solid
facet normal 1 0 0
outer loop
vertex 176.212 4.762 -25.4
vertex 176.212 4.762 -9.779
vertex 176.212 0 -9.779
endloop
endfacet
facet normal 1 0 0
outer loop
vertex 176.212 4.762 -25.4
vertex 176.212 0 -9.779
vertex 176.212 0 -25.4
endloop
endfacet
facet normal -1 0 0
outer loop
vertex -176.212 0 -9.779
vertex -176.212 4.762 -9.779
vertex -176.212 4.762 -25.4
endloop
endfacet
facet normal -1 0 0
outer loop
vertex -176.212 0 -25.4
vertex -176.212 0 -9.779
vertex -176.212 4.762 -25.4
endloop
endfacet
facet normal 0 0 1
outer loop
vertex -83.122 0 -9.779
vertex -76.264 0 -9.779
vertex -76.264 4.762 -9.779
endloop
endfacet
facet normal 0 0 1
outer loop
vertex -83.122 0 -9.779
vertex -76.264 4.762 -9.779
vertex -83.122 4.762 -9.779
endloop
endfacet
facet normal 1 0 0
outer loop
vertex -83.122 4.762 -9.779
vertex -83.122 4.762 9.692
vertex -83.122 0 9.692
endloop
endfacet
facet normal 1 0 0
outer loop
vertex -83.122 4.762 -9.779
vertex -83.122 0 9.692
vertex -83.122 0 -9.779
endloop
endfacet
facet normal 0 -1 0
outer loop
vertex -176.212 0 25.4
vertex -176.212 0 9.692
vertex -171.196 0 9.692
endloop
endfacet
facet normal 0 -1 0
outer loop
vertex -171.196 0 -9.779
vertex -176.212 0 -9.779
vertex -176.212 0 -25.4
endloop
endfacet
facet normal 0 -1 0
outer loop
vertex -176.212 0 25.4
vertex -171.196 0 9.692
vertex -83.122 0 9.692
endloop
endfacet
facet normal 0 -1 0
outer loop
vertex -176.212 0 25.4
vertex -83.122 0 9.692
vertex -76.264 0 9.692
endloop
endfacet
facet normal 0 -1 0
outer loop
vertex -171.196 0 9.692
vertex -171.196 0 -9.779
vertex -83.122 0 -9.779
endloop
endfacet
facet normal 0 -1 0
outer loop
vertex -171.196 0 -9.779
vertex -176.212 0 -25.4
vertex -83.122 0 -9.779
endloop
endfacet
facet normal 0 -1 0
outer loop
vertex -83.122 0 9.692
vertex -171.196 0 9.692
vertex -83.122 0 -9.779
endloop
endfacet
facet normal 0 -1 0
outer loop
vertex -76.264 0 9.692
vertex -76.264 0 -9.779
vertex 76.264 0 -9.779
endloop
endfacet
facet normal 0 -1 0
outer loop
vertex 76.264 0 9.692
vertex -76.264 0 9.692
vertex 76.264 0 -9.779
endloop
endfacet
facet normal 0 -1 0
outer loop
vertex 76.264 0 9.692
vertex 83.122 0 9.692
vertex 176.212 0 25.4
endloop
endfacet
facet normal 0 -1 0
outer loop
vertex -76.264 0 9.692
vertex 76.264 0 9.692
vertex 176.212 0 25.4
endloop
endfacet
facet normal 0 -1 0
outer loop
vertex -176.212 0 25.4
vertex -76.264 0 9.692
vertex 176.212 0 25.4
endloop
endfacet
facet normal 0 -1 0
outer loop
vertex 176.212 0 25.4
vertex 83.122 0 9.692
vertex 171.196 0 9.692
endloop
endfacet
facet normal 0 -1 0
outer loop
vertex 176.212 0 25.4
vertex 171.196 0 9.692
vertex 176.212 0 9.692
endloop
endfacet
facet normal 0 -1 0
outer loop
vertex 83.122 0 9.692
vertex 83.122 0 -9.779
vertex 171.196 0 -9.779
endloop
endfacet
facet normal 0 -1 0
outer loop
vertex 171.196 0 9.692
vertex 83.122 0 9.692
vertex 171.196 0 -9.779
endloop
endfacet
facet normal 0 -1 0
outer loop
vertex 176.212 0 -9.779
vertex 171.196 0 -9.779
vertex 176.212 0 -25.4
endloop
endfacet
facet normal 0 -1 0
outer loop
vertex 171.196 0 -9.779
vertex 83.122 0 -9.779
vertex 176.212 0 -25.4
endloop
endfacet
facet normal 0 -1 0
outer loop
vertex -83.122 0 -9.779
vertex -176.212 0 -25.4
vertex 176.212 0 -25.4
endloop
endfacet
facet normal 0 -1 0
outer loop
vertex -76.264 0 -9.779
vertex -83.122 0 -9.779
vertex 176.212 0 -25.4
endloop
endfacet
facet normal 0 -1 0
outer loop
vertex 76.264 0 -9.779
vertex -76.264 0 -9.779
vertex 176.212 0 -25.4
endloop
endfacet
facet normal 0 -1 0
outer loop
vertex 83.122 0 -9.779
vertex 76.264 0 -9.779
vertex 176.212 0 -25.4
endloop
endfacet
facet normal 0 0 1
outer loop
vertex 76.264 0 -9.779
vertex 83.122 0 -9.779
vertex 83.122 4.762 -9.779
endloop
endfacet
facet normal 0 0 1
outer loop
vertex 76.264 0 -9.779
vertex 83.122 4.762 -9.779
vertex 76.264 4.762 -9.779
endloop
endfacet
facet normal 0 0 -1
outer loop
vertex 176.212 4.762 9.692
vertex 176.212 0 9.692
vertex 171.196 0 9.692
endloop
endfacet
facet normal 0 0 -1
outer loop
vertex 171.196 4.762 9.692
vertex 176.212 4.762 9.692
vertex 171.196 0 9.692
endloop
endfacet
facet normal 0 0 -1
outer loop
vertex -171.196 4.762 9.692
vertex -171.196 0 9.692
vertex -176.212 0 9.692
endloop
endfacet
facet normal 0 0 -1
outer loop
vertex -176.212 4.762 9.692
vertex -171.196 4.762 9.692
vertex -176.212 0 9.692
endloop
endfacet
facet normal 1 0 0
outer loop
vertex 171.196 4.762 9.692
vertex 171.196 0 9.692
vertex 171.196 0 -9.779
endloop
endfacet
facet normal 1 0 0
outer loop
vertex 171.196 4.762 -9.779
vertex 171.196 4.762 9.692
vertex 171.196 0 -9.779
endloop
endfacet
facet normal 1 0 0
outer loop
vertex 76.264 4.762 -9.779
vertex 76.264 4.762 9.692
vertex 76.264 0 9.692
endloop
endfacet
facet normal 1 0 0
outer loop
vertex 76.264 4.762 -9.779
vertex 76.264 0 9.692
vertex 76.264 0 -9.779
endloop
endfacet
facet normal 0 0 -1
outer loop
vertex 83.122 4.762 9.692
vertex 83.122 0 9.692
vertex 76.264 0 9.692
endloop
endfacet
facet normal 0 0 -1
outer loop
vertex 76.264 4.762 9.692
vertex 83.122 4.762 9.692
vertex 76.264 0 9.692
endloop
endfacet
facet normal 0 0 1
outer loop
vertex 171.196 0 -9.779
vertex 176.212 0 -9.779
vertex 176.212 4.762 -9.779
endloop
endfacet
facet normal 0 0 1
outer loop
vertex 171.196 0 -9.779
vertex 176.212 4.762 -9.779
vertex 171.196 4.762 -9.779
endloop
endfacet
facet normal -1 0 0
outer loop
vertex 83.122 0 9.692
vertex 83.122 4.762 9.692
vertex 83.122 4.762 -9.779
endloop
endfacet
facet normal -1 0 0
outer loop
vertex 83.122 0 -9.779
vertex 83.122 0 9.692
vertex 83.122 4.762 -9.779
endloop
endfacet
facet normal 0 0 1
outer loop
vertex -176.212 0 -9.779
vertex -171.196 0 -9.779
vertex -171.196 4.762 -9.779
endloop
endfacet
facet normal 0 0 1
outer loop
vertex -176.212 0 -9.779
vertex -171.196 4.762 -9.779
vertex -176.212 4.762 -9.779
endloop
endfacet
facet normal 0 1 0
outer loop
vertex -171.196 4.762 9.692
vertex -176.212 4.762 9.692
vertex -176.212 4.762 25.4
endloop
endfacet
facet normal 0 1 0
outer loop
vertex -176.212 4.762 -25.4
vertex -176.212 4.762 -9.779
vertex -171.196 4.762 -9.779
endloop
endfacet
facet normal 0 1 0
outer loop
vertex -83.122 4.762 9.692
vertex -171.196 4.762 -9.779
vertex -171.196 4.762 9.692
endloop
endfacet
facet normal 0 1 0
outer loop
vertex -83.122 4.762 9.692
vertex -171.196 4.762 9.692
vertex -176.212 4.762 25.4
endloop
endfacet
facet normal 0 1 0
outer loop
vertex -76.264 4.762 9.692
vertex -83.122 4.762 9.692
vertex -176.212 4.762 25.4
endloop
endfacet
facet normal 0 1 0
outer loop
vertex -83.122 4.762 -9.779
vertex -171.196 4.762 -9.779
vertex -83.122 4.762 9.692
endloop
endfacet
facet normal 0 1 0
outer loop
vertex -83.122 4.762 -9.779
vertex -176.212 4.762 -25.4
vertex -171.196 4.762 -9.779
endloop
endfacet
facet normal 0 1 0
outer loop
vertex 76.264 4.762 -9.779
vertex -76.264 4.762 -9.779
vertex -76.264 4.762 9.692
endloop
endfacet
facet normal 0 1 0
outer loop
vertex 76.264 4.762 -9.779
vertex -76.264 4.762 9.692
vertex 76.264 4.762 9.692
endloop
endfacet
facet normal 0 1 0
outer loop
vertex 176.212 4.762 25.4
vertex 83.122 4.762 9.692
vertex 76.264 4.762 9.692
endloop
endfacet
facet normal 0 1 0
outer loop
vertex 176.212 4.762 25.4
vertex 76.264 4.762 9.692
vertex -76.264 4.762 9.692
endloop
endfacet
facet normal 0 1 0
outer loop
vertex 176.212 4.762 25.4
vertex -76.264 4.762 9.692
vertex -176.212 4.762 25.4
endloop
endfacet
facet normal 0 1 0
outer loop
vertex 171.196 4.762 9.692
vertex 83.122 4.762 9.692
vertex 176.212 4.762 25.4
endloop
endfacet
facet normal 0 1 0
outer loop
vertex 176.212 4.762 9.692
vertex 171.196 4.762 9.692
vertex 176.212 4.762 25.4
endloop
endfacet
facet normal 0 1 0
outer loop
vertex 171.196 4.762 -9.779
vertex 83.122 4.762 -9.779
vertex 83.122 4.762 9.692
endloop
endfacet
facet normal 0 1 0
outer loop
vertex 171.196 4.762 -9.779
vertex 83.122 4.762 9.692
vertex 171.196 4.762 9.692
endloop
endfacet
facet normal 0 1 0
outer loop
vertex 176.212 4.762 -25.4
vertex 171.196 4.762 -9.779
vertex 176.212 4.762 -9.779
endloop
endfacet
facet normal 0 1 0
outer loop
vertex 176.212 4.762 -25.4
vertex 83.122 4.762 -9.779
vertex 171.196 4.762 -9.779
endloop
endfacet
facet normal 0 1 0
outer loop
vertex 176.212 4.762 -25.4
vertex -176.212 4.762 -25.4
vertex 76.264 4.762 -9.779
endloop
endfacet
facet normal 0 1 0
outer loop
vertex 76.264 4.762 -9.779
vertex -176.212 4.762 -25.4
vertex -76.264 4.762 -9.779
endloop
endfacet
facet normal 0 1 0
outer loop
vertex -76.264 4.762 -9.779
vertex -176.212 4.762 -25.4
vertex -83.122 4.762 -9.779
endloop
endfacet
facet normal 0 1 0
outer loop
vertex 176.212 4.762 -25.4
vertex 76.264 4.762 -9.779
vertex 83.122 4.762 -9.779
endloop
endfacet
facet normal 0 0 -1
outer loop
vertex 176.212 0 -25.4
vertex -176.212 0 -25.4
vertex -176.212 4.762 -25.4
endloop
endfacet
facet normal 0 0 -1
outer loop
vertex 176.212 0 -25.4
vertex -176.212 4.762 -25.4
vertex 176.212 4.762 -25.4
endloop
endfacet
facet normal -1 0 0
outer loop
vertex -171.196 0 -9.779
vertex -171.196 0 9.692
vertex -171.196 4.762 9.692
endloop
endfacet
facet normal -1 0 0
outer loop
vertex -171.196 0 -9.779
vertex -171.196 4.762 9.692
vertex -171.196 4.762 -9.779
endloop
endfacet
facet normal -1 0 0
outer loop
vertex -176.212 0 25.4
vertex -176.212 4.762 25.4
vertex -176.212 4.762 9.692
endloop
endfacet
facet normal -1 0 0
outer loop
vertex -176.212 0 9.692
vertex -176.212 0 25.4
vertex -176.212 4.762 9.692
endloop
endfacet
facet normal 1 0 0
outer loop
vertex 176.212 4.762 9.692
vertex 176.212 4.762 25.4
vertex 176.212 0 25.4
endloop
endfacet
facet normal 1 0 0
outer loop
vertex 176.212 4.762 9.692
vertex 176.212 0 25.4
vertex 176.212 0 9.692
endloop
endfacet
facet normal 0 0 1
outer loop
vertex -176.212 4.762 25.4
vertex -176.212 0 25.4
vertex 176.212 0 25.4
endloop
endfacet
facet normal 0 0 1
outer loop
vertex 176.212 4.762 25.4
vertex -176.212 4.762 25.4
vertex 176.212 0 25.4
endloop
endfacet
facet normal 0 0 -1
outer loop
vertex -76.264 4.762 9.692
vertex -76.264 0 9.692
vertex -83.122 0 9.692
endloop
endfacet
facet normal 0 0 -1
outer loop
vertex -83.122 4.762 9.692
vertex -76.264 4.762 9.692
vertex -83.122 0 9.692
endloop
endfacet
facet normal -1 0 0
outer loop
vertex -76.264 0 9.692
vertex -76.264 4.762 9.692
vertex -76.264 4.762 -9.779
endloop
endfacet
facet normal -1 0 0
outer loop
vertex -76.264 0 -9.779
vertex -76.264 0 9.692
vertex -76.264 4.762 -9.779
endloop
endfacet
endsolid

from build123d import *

# Parameters (mm, degrees)
SKETCH1_W           = 355.6
SKETCH1_H           = 50.8
BOSS_EXTRUDE1_DEPTH = 4.7625
SKETCH2_W           = 6.858
SKETCH2_H           = 19.471321321
SKETCH2_W_2         = 6.35
SKETCH2_H_2         = 18.963321321
CUT_EXTRUDE1_DEPTH  = 180.668253752
SKETCH3_W           = 1.5875
SKETCH3_H           = 15.707678679
SKETCH3_H_2         = 15.621
CUT_EXTRUDE2_DEPTH  = 180.668253752
SKETCH4_W           = 0.3175
SKETCH4_H           = 19.471321321
BOSS_EXTRUDE2_DEPTH = 4.7625
SKETCH5_W           = 0.3175
SKETCH5_H           = 19.471321321
CUT_EXTRUDE4_DEPTH  = 179.097407512


with BuildPart() as part:
    # Sketch1 → Boss-Extrude1 (new body)
    with BuildSketch(Plane(origin=(0, 0, 0), x_dir=(1, 0, 0), z_dir=(0, 1, 0))):
        Rectangle(SKETCH1_W, SKETCH1_H)
    extrude(amount=BOSS_EXTRUDE1_DEPTH)

    # Sketch2 → Cut-Extrude1 (cut, through all)
    with BuildSketch(Plane(origin=(0, 0, 0), x_dir=(-1, 0, 0), z_dir=(0, -1, 0))):
        with Locations((174.625, 0.043339339)):
            Rectangle(SKETCH2_W, SKETCH2_H)
        with Locations((174.625, 0.04333934)):
            Rectangle(SKETCH2_W_2, SKETCH2_H_2, mode=Mode.SUBTRACT)
        with Locations((79.375, 0.043339339)):
            Rectangle(SKETCH2_W, SKETCH2_H)
        with Locations((79.375, 0.04333934)):
            Rectangle(SKETCH2_W_2, SKETCH2_H_2, mode=Mode.SUBTRACT)
        with Locations((-79.375, 0.043339339)):
            Rectangle(SKETCH2_W, SKETCH2_H)
        with Locations((-79.375, 0.04333934)):
            Rectangle(SKETCH2_W_2, SKETCH2_H_2, mode=Mode.SUBTRACT)
        with Locations((-174.625, 0.043339339)):
            Rectangle(SKETCH2_W, SKETCH2_H)
        with Locations((-174.625, 0.04333934)):
            Rectangle(SKETCH2_W_2, SKETCH2_H_2, mode=Mode.SUBTRACT)
    extrude(amount=-CUT_EXTRUDE1_DEPTH, mode=Mode.SUBTRACT)


with BuildPart() as body_2:
    # of the pieces the cut leaves, the one that is kept (cut_extrude1_keep)
    add(part.part.solids().sort_by_distance((-177.8, 0, -25.4))[0])

    # Sketch3 → Cut-Extrude2 (cut, through all)
    with BuildSketch(Plane(origin=(0, 4.7625, 0), x_dir=(1, 0, 0), z_dir=(0, 1, 0))):
        with Locations((-177.00625, -17.546160661)):
            Rectangle(SKETCH3_W, SKETCH3_H)
        with Locations((-177.00625, 17.5895)):
            Rectangle(SKETCH3_W, SKETCH3_H_2)
        with Locations((177.00625, -17.546160661)):
            Rectangle(SKETCH3_W, SKETCH3_H)
        with Locations((177.00625, 17.5895)):
            Rectangle(SKETCH3_W, SKETCH3_H_2)
    extrude(amount=-CUT_EXTRUDE2_DEPTH, mode=Mode.SUBTRACT)

    # Sketch4 → Boss-Extrude2 (add)
    with BuildSketch(Plane(origin=(0, 4.7625, 0), x_dir=(1, 0, 0), z_dir=(0, 1, 0))):
        with Locations((-76.10475, 0.043339339)):
            Rectangle(SKETCH4_W, SKETCH4_H)
        with Locations((76.10475, 0.043339339)):
            Rectangle(SKETCH4_W, SKETCH4_H)
    extrude(amount=-BOSS_EXTRUDE2_DEPTH)

    # Sketch5 → Cut-Extrude4 (cut, through all)
    with BuildSketch(Plane(origin=(0, 4.7625, 0), x_dir=(1, 0, 0), z_dir=(0, 1, 0))):
        with Locations((-82.96275, 0.043339339)):
            Rectangle(SKETCH5_W, SKETCH5_H)
        with Locations((82.96275, 0.043339339)):
            Rectangle(SKETCH5_W, SKETCH5_H)
    extrude(amount=-CUT_EXTRUDE4_DEPTH, mode=Mode.SUBTRACT)


solid = body_2.part
